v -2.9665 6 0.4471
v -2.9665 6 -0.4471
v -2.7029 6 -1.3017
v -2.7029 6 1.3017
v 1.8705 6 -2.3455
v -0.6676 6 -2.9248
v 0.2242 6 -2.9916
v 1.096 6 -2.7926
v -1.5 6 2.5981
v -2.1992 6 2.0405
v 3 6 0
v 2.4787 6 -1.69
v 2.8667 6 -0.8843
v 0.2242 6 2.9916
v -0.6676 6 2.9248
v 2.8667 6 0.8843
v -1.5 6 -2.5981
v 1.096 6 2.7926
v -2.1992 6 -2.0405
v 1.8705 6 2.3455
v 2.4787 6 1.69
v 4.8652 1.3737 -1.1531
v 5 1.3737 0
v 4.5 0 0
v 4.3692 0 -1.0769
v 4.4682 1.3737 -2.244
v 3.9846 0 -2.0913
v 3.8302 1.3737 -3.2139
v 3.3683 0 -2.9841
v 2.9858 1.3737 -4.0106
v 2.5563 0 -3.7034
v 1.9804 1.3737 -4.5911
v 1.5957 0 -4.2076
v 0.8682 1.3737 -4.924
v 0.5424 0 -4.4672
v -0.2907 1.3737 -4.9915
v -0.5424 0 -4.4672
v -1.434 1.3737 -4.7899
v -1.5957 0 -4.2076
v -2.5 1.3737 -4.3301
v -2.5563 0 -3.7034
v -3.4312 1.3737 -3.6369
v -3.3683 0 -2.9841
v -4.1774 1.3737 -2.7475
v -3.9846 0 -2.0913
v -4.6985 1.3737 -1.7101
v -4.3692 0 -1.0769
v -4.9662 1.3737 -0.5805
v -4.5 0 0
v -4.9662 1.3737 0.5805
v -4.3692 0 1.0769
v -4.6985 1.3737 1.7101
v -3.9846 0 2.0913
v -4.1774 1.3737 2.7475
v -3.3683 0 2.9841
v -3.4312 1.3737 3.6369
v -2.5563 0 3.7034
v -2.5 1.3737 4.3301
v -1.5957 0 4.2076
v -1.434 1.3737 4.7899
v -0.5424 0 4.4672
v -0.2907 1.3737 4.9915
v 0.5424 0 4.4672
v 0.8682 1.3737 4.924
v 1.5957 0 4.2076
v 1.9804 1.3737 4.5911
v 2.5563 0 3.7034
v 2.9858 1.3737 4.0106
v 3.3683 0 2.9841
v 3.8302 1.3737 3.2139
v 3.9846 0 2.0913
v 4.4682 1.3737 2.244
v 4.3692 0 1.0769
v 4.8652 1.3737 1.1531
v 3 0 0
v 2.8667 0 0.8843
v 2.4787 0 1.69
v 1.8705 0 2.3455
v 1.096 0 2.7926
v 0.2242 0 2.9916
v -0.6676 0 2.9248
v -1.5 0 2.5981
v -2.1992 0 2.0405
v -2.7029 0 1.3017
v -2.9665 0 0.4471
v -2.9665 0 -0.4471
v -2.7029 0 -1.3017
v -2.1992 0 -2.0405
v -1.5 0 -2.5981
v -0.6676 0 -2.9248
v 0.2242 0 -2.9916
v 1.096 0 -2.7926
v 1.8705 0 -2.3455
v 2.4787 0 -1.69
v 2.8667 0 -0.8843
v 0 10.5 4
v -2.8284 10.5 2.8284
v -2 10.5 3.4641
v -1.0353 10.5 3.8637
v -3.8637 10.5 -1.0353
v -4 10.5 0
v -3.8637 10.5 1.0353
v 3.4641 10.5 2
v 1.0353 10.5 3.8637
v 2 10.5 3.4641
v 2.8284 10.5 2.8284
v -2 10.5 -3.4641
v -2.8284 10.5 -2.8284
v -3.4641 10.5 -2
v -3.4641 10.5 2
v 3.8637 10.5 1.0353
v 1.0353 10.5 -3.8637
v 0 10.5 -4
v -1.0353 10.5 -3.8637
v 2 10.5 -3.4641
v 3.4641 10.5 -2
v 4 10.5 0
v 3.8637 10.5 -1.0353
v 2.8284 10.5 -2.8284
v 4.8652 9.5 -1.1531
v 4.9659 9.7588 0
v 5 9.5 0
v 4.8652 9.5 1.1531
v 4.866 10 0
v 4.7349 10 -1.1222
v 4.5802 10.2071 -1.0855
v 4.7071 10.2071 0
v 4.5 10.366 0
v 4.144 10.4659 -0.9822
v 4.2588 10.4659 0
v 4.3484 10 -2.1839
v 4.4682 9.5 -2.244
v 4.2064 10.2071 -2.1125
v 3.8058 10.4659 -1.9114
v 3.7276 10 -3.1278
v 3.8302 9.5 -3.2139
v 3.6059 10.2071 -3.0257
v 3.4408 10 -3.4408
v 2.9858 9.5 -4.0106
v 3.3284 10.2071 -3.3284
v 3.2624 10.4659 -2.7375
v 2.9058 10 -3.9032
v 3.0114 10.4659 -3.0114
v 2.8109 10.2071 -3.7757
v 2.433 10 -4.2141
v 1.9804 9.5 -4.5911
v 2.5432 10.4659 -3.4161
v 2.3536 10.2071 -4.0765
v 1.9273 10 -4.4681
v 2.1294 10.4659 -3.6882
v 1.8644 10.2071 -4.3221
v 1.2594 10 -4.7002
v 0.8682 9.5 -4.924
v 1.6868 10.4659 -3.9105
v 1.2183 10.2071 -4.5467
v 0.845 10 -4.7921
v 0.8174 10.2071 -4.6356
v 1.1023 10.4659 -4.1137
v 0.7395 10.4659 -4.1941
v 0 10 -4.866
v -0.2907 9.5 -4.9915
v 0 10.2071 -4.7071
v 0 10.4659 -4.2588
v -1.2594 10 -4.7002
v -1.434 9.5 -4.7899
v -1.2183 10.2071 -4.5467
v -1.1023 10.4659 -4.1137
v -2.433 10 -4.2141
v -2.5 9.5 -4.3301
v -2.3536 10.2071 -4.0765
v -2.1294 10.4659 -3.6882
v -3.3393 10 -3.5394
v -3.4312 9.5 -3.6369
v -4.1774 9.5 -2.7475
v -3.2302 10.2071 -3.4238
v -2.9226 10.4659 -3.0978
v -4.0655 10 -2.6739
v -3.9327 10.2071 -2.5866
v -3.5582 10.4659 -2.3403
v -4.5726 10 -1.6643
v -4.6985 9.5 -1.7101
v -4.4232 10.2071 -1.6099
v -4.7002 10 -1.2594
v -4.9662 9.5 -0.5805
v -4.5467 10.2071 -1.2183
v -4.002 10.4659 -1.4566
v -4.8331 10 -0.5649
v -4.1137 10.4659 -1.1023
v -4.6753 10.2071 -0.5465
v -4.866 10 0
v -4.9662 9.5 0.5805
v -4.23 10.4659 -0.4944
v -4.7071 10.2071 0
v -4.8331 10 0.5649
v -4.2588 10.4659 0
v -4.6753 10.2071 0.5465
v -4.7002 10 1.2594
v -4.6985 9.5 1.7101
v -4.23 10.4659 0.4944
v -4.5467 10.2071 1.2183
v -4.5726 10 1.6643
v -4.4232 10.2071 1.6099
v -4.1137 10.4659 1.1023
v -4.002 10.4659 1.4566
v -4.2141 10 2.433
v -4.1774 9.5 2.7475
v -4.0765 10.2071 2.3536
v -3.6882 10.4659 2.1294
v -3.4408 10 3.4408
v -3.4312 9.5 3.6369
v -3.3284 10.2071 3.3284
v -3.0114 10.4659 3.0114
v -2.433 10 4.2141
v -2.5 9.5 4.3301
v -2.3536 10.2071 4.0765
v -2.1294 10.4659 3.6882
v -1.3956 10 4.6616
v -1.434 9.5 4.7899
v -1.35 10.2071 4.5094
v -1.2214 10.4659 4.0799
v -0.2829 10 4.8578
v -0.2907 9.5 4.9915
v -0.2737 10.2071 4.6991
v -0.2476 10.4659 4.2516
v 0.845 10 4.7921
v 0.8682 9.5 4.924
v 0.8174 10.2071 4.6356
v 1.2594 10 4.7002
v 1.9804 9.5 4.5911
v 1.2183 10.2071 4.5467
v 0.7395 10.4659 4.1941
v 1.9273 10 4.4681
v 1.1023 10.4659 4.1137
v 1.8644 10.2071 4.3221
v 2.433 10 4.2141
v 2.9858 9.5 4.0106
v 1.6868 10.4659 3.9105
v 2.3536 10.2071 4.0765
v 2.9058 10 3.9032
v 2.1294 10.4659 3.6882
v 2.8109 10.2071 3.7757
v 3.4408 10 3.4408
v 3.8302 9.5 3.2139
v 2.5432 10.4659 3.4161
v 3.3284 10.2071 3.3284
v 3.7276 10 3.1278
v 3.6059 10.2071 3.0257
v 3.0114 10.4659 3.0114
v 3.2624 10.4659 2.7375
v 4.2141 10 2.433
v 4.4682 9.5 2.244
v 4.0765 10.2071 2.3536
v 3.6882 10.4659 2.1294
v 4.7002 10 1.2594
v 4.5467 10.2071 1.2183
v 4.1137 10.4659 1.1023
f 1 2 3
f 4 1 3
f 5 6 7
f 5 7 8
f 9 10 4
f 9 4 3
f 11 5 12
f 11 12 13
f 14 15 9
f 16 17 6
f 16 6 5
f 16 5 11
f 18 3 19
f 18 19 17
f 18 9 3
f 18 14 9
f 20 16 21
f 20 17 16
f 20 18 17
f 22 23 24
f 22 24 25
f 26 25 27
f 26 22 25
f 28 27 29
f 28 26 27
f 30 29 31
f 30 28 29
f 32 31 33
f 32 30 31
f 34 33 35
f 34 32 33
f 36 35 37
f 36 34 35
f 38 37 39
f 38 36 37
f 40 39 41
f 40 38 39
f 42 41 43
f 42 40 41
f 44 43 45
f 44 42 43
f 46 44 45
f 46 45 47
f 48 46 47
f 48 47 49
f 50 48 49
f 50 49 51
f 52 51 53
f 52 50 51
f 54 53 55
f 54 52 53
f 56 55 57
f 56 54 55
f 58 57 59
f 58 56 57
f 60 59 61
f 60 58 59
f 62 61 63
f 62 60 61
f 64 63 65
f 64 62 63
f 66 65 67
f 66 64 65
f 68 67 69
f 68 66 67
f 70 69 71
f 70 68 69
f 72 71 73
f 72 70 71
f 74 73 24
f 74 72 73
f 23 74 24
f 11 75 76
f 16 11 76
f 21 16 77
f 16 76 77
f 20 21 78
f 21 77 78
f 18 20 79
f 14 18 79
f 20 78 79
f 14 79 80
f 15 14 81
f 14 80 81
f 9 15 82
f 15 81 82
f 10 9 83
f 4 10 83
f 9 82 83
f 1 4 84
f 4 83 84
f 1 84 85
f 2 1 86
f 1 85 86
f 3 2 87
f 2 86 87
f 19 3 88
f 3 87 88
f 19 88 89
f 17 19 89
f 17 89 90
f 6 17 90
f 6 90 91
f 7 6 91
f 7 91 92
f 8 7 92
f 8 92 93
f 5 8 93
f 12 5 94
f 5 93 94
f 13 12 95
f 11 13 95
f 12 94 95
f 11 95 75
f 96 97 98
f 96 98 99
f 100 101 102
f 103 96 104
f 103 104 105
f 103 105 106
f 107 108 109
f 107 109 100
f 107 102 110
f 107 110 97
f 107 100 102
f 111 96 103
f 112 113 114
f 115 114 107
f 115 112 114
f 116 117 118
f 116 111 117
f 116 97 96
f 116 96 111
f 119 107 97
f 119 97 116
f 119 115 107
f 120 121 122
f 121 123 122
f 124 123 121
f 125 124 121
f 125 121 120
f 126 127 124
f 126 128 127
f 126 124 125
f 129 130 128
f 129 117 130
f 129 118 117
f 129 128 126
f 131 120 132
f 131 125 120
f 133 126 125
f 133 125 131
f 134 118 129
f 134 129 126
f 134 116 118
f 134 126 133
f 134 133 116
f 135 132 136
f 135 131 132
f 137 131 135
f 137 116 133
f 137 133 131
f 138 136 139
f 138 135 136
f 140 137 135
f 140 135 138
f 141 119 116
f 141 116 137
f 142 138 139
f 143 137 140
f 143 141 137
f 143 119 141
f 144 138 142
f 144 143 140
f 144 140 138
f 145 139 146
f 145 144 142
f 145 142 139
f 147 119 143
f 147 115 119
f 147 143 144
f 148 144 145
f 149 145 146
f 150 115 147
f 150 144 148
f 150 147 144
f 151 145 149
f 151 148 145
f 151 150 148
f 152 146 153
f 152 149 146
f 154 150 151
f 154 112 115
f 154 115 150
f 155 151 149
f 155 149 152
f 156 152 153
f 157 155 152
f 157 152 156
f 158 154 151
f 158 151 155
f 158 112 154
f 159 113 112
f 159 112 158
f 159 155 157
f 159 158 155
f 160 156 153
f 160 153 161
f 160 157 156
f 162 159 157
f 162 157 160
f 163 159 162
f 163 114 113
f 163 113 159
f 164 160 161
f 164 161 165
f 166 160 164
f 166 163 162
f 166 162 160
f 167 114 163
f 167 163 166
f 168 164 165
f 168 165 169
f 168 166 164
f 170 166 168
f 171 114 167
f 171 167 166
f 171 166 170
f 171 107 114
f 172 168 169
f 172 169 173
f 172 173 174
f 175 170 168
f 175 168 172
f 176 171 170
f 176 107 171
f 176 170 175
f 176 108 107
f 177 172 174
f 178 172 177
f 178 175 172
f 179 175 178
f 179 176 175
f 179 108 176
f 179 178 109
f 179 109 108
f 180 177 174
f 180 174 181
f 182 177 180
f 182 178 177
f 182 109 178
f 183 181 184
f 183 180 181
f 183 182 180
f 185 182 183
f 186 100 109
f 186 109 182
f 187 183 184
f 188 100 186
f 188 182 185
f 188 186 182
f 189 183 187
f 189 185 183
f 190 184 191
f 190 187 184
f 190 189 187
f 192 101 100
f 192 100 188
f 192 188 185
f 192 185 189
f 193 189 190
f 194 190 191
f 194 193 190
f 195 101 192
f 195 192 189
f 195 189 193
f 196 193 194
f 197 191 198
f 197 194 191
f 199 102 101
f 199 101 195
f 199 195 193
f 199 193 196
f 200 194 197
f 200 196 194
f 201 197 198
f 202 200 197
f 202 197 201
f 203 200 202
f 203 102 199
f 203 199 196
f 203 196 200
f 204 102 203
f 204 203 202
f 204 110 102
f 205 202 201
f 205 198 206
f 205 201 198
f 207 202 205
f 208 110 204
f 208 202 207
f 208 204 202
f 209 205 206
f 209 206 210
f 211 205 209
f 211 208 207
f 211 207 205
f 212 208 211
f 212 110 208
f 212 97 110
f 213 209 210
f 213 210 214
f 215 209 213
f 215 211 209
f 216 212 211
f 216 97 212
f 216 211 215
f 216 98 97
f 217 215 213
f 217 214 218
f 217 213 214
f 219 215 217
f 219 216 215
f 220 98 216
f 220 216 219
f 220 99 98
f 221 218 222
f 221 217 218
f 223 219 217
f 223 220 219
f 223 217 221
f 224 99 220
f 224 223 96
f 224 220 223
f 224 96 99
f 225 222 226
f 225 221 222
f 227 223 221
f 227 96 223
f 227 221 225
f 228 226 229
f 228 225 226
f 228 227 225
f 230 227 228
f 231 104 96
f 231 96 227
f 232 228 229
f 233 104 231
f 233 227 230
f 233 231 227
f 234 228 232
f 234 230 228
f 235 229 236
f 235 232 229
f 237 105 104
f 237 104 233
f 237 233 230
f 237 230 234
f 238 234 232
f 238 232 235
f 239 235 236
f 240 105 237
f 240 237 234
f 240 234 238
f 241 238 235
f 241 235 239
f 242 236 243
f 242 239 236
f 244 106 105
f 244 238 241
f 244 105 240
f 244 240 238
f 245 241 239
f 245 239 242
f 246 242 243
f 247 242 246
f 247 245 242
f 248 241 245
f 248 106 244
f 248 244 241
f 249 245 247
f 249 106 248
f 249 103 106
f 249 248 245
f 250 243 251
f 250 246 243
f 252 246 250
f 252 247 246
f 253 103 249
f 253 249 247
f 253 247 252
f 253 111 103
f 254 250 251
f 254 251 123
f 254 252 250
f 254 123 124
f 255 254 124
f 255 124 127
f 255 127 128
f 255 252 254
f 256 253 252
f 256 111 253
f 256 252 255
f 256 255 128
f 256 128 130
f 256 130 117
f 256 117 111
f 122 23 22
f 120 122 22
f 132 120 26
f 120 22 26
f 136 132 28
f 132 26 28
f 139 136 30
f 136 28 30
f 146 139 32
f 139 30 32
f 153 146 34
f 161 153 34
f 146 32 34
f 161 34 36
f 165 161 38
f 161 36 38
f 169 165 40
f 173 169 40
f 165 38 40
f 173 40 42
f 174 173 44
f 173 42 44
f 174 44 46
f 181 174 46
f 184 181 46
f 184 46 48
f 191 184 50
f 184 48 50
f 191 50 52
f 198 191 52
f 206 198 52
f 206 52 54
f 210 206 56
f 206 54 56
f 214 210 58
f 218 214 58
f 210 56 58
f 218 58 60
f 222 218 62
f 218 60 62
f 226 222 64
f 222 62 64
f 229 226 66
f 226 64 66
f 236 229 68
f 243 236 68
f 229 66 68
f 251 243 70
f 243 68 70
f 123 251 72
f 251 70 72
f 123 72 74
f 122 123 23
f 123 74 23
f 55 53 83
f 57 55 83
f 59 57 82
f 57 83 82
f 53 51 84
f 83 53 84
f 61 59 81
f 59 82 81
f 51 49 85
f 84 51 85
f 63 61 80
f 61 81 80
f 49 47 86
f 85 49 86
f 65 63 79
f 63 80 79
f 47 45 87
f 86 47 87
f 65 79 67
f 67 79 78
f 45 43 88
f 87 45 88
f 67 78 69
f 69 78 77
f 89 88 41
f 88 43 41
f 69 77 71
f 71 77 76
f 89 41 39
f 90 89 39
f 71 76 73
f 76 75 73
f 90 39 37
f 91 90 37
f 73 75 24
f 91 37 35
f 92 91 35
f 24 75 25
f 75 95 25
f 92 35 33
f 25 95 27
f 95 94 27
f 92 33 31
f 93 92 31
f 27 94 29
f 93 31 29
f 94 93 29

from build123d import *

# Parameters (mm, degrees)
SKETCH1_R           = 5
BOSS_EXTRUDE1_DEPTH = 10.5
SKETCH2_R           = 3
CUT_EXTRUDE1_DEPTH  = 6
FILLET1_R           = 1
CHAMFER1_SIZE       = 0.5
CHAMFER1_SIZE2      = 1.37373871


with BuildPart() as part:
    # Sketch1 → Boss-Extrude1 (new body)
    with BuildSketch(Plane(origin=(0, 0, 0), x_dir=(1, 0, 0), z_dir=(0, 1, 0))):
        Circle(SKETCH1_R)
    extrude(amount=BOSS_EXTRUDE1_DEPTH)

    # Sketch2 → Cut-Extrude1 (cut)
    with BuildSketch(Plane.XZ):
        Circle(SKETCH2_R)
    extrude(amount=-CUT_EXTRUDE1_DEPTH, mode=Mode.SUBTRACT)

    # Fillet1
    fillet1_edges = [part.edges().sort_by_distance(p)[0] for p in [
        (-5, 10.5, 0),
    ]]
    fillet(fillet1_edges, radius=FILLET1_R)

    # Chamfer1
    chamfer1_edges = [part.edges().sort_by_distance(p)[0] for p in [
        (-5, 0, 0),
    ]]
    chamfer1_side = [part.faces().sort_by_distance(p)[0] for p in [
        (-4.858578644, 0, 0),
    ]]
    chamfer(chamfer1_edges, length=CHAMFER1_SIZE, length2=CHAMFER1_SIZE2, reference=chamfer1_side[0])


solid = part.part
